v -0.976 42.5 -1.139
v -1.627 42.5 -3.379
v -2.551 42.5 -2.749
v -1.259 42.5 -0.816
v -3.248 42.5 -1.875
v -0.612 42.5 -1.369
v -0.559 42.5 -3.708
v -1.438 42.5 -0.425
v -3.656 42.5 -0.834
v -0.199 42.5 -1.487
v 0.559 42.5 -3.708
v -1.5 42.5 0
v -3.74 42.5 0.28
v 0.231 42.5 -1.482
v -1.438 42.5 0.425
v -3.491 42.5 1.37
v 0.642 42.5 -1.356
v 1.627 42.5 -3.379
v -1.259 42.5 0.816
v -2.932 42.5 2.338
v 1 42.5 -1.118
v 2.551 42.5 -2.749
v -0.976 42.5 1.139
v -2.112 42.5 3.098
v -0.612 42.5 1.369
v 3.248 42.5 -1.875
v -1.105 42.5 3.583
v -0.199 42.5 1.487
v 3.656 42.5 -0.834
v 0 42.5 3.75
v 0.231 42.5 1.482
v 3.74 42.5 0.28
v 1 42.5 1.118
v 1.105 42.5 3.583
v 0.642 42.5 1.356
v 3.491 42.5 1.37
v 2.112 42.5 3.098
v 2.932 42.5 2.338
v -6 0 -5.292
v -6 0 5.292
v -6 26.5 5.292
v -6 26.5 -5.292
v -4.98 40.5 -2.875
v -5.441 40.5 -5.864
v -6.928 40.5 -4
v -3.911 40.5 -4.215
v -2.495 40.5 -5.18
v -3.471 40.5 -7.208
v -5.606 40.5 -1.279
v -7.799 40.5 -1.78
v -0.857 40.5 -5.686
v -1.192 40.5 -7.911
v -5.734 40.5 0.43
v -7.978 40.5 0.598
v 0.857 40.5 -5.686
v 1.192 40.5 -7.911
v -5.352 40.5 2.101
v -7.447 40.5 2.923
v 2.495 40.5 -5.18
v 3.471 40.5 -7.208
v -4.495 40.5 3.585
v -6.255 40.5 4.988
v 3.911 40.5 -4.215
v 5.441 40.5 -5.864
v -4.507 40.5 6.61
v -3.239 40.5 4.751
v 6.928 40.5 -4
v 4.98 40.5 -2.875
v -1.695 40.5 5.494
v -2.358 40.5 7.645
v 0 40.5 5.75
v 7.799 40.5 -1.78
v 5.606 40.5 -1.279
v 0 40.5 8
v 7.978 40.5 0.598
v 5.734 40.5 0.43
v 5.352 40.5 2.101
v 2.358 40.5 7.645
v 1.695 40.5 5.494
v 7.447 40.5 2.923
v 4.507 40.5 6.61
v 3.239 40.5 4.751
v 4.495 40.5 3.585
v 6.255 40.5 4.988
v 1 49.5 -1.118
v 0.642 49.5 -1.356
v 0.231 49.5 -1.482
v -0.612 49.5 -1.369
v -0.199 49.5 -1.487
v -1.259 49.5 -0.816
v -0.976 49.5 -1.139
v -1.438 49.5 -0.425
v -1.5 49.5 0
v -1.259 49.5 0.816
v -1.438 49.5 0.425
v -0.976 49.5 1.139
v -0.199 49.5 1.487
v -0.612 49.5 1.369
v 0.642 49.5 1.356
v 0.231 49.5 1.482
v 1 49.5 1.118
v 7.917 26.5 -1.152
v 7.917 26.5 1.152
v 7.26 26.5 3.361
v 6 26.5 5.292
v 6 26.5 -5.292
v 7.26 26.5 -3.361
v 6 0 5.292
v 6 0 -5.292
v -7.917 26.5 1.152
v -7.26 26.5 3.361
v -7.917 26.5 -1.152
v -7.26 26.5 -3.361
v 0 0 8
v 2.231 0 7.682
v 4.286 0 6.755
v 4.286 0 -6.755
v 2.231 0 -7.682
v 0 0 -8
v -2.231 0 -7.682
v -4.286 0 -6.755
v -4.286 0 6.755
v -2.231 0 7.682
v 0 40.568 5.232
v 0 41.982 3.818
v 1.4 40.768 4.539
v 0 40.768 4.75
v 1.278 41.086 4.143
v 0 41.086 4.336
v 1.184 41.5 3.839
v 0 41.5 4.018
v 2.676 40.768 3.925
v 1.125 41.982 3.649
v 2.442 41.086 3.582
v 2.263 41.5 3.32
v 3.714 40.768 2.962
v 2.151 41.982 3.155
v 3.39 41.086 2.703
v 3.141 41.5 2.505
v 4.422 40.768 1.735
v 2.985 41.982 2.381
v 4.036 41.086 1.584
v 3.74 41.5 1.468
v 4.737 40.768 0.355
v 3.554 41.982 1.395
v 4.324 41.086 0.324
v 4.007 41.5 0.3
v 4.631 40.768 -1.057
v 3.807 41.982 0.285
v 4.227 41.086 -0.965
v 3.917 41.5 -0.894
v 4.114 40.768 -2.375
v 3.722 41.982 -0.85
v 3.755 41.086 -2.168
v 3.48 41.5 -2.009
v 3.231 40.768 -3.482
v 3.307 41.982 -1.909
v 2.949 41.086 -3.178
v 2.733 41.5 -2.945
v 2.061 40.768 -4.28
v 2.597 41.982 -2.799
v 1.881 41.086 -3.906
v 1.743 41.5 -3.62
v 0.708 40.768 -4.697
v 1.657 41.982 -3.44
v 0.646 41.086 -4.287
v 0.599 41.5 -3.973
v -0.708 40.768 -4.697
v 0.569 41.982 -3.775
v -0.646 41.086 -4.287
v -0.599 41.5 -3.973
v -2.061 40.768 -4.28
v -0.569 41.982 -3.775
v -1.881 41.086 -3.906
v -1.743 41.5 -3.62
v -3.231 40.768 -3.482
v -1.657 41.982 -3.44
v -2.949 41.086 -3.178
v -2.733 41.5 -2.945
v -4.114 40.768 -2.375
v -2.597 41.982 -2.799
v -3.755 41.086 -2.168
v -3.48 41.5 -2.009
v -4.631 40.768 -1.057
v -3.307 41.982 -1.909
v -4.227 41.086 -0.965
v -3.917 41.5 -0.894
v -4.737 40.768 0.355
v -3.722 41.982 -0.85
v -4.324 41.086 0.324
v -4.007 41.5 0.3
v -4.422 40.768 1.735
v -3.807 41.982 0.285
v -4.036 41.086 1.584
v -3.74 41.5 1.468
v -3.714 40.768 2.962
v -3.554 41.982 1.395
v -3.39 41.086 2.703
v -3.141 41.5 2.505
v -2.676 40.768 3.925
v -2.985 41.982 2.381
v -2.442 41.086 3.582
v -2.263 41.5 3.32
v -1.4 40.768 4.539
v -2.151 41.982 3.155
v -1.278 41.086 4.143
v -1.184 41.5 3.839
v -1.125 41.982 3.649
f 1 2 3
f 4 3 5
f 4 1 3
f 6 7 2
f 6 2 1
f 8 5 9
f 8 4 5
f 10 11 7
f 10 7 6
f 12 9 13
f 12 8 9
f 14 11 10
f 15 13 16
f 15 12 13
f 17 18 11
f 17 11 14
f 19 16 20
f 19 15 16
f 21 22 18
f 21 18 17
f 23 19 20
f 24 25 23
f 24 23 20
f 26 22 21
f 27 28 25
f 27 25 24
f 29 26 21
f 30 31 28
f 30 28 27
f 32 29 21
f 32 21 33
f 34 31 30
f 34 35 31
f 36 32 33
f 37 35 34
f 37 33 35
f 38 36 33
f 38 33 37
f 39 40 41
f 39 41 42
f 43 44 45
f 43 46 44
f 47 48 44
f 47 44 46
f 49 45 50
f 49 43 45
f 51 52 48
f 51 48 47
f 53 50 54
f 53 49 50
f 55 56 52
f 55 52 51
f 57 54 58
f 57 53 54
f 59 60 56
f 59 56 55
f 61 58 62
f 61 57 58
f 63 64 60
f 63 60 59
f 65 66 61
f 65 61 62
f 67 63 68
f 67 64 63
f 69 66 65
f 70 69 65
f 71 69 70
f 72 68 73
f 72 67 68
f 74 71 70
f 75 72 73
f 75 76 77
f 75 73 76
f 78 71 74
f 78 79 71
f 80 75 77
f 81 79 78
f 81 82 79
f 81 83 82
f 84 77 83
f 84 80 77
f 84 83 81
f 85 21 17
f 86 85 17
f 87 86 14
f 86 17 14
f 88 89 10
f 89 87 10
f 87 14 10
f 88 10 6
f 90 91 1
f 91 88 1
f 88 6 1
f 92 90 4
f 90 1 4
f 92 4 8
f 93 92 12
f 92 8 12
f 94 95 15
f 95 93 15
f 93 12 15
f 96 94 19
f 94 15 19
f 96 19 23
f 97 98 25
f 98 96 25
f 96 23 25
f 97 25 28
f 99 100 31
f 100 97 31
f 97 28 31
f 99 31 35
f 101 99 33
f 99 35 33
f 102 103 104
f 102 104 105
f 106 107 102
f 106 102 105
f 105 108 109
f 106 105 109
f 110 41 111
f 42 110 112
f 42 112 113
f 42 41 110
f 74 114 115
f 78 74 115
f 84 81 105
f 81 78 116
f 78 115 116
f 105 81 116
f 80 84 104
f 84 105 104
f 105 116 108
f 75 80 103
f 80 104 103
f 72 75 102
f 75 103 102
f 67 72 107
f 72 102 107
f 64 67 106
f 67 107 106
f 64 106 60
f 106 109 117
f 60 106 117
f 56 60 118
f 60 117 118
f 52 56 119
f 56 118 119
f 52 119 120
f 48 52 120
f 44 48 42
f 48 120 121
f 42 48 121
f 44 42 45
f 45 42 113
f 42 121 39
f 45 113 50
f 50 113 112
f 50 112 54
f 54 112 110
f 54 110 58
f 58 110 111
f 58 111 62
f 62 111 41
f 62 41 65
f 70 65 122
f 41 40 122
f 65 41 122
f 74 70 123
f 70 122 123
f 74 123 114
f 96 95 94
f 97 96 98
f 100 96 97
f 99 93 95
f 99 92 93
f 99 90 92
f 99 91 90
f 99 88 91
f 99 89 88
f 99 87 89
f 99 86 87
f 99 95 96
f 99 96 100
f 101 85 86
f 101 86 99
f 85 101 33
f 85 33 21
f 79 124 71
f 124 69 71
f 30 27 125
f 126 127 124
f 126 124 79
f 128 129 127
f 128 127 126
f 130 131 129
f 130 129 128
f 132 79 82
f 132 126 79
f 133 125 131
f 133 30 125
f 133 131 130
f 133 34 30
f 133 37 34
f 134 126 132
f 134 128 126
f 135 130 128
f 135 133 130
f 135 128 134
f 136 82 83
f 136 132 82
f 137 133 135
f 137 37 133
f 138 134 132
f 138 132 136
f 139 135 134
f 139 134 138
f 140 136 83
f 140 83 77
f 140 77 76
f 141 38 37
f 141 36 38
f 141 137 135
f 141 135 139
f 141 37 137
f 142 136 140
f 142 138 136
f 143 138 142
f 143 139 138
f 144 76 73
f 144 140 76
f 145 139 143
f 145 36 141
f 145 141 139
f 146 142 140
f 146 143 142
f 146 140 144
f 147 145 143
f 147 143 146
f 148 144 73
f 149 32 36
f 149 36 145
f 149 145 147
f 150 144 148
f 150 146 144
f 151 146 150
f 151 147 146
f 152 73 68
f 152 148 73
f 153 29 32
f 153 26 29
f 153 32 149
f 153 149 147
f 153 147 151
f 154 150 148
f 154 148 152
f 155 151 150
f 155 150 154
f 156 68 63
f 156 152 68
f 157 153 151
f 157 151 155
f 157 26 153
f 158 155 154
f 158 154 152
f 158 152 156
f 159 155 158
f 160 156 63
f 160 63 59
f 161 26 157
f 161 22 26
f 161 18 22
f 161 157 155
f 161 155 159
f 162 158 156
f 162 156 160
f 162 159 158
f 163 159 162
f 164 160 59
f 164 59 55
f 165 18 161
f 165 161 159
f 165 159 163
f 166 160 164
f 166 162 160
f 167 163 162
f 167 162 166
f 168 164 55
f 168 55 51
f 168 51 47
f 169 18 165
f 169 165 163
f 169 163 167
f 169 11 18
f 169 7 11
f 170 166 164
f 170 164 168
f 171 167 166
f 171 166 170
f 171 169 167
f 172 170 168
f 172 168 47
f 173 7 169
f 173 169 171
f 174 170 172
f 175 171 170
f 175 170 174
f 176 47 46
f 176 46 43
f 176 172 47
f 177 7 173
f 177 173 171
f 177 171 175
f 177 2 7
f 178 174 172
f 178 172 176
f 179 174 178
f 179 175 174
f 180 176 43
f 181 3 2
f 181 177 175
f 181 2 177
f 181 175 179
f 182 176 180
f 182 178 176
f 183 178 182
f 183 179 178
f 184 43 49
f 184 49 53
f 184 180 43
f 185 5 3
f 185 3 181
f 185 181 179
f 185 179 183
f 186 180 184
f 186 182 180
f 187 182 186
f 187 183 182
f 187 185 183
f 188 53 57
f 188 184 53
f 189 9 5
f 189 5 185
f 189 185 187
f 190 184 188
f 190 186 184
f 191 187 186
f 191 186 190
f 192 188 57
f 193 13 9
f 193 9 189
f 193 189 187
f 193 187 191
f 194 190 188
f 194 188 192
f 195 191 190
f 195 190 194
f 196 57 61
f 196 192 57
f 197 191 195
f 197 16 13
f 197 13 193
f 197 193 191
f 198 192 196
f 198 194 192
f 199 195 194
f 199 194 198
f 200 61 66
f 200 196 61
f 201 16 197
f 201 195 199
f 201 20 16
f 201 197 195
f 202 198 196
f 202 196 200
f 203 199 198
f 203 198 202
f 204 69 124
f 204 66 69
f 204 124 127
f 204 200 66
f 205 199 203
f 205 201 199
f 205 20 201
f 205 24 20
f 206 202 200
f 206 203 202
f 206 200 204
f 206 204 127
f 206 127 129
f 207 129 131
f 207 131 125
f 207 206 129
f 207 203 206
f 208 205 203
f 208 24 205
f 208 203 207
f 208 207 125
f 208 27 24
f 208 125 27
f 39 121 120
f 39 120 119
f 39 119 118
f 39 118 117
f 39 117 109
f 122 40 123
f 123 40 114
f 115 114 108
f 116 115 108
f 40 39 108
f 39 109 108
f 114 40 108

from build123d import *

# Parameters (mm, degrees)
SKETCH1_R           = 8
BOSS_EXTRUDE1_DEPTH = 40.5
SKETCH2_W           = 6
SKETCH2_H           = 10.583005244
CUT_EXTRUDE1_DEPTH  = 26.5
SKETCH3_R           = 3.75
BOSS_EXTRUDE2_DEPTH = 2
FILLET1_R           = 2
SKETCH4_R           = 1.5
BOSS_EXTRUDE3_DEPTH = 7
SKETCH5_W           = 0.5
SKETCH5_H           = 2.236067978
CUT_EXTRUDE2_DEPTH  = 7


with BuildPart() as part:
    # Sketch1 → Boss-Extrude1 (new body)
    with BuildSketch(Plane(origin=(0, 0, 0), x_dir=(1, 0, 0), z_dir=(0, 1, 0))):
        with Locations(Location((0, 0, 0), (0, 0, 270))):
            Circle(SKETCH1_R)
    extrude(amount=BOSS_EXTRUDE1_DEPTH)

    # Sketch2 → Cut-Extrude1 (cut)
    with BuildSketch(Plane(origin=(0, 0, 0), x_dir=(-1, 0, 0), z_dir=(0, -1, 0))):
        with Locations((9, 0)):
            Rectangle(SKETCH2_W, SKETCH2_H)
        with Locations((-9, 0)):
            Rectangle(SKETCH2_W, SKETCH2_H)
    extrude(amount=-CUT_EXTRUDE1_DEPTH, mode=Mode.SUBTRACT)

    # Sketch3 → Boss-Extrude2 (add)
    with BuildSketch(Plane(origin=(0, 40.5, 0), x_dir=(1, 0, 0), z_dir=(0, 1, 0))):
        with Locations(Location((0, 0, 0), (0, 0, 270))):
            Circle(SKETCH3_R)
    extrude(amount=BOSS_EXTRUDE2_DEPTH)

    # Fillet1
    fillet1_edges = [part.edges().sort_by_distance(p)[0] for p in [
        (0, 40.5, -3.75),
    ]]
    fillet(fillet1_edges, radius=FILLET1_R - 0.0001)  # a hair under: the kernel refuses the full size

    # Sketch4 → Boss-Extrude3 (add)
    with BuildSketch(Plane(origin=(0, 42.5, 0), x_dir=(1, 0, 0), z_dir=(0, 1, 0))):
        with Locations(Location((0, 0, 0), (0, 0, 270))):
            Circle(SKETCH4_R)
    extrude(amount=BOSS_EXTRUDE3_DEPTH)

    # Sketch5 → Cut-Extrude2 (cut)
    with BuildSketch(Plane(origin=(0, 49.5, 0), x_dir=(1, 0, 0), z_dir=(0, 1, 0))):
        with Locations((1.25, 0)):
            Rectangle(SKETCH5_W, SKETCH5_H)
    extrude(amount=-CUT_EXTRUDE2_DEPTH, mode=Mode.SUBTRACT)


solid = part.part
